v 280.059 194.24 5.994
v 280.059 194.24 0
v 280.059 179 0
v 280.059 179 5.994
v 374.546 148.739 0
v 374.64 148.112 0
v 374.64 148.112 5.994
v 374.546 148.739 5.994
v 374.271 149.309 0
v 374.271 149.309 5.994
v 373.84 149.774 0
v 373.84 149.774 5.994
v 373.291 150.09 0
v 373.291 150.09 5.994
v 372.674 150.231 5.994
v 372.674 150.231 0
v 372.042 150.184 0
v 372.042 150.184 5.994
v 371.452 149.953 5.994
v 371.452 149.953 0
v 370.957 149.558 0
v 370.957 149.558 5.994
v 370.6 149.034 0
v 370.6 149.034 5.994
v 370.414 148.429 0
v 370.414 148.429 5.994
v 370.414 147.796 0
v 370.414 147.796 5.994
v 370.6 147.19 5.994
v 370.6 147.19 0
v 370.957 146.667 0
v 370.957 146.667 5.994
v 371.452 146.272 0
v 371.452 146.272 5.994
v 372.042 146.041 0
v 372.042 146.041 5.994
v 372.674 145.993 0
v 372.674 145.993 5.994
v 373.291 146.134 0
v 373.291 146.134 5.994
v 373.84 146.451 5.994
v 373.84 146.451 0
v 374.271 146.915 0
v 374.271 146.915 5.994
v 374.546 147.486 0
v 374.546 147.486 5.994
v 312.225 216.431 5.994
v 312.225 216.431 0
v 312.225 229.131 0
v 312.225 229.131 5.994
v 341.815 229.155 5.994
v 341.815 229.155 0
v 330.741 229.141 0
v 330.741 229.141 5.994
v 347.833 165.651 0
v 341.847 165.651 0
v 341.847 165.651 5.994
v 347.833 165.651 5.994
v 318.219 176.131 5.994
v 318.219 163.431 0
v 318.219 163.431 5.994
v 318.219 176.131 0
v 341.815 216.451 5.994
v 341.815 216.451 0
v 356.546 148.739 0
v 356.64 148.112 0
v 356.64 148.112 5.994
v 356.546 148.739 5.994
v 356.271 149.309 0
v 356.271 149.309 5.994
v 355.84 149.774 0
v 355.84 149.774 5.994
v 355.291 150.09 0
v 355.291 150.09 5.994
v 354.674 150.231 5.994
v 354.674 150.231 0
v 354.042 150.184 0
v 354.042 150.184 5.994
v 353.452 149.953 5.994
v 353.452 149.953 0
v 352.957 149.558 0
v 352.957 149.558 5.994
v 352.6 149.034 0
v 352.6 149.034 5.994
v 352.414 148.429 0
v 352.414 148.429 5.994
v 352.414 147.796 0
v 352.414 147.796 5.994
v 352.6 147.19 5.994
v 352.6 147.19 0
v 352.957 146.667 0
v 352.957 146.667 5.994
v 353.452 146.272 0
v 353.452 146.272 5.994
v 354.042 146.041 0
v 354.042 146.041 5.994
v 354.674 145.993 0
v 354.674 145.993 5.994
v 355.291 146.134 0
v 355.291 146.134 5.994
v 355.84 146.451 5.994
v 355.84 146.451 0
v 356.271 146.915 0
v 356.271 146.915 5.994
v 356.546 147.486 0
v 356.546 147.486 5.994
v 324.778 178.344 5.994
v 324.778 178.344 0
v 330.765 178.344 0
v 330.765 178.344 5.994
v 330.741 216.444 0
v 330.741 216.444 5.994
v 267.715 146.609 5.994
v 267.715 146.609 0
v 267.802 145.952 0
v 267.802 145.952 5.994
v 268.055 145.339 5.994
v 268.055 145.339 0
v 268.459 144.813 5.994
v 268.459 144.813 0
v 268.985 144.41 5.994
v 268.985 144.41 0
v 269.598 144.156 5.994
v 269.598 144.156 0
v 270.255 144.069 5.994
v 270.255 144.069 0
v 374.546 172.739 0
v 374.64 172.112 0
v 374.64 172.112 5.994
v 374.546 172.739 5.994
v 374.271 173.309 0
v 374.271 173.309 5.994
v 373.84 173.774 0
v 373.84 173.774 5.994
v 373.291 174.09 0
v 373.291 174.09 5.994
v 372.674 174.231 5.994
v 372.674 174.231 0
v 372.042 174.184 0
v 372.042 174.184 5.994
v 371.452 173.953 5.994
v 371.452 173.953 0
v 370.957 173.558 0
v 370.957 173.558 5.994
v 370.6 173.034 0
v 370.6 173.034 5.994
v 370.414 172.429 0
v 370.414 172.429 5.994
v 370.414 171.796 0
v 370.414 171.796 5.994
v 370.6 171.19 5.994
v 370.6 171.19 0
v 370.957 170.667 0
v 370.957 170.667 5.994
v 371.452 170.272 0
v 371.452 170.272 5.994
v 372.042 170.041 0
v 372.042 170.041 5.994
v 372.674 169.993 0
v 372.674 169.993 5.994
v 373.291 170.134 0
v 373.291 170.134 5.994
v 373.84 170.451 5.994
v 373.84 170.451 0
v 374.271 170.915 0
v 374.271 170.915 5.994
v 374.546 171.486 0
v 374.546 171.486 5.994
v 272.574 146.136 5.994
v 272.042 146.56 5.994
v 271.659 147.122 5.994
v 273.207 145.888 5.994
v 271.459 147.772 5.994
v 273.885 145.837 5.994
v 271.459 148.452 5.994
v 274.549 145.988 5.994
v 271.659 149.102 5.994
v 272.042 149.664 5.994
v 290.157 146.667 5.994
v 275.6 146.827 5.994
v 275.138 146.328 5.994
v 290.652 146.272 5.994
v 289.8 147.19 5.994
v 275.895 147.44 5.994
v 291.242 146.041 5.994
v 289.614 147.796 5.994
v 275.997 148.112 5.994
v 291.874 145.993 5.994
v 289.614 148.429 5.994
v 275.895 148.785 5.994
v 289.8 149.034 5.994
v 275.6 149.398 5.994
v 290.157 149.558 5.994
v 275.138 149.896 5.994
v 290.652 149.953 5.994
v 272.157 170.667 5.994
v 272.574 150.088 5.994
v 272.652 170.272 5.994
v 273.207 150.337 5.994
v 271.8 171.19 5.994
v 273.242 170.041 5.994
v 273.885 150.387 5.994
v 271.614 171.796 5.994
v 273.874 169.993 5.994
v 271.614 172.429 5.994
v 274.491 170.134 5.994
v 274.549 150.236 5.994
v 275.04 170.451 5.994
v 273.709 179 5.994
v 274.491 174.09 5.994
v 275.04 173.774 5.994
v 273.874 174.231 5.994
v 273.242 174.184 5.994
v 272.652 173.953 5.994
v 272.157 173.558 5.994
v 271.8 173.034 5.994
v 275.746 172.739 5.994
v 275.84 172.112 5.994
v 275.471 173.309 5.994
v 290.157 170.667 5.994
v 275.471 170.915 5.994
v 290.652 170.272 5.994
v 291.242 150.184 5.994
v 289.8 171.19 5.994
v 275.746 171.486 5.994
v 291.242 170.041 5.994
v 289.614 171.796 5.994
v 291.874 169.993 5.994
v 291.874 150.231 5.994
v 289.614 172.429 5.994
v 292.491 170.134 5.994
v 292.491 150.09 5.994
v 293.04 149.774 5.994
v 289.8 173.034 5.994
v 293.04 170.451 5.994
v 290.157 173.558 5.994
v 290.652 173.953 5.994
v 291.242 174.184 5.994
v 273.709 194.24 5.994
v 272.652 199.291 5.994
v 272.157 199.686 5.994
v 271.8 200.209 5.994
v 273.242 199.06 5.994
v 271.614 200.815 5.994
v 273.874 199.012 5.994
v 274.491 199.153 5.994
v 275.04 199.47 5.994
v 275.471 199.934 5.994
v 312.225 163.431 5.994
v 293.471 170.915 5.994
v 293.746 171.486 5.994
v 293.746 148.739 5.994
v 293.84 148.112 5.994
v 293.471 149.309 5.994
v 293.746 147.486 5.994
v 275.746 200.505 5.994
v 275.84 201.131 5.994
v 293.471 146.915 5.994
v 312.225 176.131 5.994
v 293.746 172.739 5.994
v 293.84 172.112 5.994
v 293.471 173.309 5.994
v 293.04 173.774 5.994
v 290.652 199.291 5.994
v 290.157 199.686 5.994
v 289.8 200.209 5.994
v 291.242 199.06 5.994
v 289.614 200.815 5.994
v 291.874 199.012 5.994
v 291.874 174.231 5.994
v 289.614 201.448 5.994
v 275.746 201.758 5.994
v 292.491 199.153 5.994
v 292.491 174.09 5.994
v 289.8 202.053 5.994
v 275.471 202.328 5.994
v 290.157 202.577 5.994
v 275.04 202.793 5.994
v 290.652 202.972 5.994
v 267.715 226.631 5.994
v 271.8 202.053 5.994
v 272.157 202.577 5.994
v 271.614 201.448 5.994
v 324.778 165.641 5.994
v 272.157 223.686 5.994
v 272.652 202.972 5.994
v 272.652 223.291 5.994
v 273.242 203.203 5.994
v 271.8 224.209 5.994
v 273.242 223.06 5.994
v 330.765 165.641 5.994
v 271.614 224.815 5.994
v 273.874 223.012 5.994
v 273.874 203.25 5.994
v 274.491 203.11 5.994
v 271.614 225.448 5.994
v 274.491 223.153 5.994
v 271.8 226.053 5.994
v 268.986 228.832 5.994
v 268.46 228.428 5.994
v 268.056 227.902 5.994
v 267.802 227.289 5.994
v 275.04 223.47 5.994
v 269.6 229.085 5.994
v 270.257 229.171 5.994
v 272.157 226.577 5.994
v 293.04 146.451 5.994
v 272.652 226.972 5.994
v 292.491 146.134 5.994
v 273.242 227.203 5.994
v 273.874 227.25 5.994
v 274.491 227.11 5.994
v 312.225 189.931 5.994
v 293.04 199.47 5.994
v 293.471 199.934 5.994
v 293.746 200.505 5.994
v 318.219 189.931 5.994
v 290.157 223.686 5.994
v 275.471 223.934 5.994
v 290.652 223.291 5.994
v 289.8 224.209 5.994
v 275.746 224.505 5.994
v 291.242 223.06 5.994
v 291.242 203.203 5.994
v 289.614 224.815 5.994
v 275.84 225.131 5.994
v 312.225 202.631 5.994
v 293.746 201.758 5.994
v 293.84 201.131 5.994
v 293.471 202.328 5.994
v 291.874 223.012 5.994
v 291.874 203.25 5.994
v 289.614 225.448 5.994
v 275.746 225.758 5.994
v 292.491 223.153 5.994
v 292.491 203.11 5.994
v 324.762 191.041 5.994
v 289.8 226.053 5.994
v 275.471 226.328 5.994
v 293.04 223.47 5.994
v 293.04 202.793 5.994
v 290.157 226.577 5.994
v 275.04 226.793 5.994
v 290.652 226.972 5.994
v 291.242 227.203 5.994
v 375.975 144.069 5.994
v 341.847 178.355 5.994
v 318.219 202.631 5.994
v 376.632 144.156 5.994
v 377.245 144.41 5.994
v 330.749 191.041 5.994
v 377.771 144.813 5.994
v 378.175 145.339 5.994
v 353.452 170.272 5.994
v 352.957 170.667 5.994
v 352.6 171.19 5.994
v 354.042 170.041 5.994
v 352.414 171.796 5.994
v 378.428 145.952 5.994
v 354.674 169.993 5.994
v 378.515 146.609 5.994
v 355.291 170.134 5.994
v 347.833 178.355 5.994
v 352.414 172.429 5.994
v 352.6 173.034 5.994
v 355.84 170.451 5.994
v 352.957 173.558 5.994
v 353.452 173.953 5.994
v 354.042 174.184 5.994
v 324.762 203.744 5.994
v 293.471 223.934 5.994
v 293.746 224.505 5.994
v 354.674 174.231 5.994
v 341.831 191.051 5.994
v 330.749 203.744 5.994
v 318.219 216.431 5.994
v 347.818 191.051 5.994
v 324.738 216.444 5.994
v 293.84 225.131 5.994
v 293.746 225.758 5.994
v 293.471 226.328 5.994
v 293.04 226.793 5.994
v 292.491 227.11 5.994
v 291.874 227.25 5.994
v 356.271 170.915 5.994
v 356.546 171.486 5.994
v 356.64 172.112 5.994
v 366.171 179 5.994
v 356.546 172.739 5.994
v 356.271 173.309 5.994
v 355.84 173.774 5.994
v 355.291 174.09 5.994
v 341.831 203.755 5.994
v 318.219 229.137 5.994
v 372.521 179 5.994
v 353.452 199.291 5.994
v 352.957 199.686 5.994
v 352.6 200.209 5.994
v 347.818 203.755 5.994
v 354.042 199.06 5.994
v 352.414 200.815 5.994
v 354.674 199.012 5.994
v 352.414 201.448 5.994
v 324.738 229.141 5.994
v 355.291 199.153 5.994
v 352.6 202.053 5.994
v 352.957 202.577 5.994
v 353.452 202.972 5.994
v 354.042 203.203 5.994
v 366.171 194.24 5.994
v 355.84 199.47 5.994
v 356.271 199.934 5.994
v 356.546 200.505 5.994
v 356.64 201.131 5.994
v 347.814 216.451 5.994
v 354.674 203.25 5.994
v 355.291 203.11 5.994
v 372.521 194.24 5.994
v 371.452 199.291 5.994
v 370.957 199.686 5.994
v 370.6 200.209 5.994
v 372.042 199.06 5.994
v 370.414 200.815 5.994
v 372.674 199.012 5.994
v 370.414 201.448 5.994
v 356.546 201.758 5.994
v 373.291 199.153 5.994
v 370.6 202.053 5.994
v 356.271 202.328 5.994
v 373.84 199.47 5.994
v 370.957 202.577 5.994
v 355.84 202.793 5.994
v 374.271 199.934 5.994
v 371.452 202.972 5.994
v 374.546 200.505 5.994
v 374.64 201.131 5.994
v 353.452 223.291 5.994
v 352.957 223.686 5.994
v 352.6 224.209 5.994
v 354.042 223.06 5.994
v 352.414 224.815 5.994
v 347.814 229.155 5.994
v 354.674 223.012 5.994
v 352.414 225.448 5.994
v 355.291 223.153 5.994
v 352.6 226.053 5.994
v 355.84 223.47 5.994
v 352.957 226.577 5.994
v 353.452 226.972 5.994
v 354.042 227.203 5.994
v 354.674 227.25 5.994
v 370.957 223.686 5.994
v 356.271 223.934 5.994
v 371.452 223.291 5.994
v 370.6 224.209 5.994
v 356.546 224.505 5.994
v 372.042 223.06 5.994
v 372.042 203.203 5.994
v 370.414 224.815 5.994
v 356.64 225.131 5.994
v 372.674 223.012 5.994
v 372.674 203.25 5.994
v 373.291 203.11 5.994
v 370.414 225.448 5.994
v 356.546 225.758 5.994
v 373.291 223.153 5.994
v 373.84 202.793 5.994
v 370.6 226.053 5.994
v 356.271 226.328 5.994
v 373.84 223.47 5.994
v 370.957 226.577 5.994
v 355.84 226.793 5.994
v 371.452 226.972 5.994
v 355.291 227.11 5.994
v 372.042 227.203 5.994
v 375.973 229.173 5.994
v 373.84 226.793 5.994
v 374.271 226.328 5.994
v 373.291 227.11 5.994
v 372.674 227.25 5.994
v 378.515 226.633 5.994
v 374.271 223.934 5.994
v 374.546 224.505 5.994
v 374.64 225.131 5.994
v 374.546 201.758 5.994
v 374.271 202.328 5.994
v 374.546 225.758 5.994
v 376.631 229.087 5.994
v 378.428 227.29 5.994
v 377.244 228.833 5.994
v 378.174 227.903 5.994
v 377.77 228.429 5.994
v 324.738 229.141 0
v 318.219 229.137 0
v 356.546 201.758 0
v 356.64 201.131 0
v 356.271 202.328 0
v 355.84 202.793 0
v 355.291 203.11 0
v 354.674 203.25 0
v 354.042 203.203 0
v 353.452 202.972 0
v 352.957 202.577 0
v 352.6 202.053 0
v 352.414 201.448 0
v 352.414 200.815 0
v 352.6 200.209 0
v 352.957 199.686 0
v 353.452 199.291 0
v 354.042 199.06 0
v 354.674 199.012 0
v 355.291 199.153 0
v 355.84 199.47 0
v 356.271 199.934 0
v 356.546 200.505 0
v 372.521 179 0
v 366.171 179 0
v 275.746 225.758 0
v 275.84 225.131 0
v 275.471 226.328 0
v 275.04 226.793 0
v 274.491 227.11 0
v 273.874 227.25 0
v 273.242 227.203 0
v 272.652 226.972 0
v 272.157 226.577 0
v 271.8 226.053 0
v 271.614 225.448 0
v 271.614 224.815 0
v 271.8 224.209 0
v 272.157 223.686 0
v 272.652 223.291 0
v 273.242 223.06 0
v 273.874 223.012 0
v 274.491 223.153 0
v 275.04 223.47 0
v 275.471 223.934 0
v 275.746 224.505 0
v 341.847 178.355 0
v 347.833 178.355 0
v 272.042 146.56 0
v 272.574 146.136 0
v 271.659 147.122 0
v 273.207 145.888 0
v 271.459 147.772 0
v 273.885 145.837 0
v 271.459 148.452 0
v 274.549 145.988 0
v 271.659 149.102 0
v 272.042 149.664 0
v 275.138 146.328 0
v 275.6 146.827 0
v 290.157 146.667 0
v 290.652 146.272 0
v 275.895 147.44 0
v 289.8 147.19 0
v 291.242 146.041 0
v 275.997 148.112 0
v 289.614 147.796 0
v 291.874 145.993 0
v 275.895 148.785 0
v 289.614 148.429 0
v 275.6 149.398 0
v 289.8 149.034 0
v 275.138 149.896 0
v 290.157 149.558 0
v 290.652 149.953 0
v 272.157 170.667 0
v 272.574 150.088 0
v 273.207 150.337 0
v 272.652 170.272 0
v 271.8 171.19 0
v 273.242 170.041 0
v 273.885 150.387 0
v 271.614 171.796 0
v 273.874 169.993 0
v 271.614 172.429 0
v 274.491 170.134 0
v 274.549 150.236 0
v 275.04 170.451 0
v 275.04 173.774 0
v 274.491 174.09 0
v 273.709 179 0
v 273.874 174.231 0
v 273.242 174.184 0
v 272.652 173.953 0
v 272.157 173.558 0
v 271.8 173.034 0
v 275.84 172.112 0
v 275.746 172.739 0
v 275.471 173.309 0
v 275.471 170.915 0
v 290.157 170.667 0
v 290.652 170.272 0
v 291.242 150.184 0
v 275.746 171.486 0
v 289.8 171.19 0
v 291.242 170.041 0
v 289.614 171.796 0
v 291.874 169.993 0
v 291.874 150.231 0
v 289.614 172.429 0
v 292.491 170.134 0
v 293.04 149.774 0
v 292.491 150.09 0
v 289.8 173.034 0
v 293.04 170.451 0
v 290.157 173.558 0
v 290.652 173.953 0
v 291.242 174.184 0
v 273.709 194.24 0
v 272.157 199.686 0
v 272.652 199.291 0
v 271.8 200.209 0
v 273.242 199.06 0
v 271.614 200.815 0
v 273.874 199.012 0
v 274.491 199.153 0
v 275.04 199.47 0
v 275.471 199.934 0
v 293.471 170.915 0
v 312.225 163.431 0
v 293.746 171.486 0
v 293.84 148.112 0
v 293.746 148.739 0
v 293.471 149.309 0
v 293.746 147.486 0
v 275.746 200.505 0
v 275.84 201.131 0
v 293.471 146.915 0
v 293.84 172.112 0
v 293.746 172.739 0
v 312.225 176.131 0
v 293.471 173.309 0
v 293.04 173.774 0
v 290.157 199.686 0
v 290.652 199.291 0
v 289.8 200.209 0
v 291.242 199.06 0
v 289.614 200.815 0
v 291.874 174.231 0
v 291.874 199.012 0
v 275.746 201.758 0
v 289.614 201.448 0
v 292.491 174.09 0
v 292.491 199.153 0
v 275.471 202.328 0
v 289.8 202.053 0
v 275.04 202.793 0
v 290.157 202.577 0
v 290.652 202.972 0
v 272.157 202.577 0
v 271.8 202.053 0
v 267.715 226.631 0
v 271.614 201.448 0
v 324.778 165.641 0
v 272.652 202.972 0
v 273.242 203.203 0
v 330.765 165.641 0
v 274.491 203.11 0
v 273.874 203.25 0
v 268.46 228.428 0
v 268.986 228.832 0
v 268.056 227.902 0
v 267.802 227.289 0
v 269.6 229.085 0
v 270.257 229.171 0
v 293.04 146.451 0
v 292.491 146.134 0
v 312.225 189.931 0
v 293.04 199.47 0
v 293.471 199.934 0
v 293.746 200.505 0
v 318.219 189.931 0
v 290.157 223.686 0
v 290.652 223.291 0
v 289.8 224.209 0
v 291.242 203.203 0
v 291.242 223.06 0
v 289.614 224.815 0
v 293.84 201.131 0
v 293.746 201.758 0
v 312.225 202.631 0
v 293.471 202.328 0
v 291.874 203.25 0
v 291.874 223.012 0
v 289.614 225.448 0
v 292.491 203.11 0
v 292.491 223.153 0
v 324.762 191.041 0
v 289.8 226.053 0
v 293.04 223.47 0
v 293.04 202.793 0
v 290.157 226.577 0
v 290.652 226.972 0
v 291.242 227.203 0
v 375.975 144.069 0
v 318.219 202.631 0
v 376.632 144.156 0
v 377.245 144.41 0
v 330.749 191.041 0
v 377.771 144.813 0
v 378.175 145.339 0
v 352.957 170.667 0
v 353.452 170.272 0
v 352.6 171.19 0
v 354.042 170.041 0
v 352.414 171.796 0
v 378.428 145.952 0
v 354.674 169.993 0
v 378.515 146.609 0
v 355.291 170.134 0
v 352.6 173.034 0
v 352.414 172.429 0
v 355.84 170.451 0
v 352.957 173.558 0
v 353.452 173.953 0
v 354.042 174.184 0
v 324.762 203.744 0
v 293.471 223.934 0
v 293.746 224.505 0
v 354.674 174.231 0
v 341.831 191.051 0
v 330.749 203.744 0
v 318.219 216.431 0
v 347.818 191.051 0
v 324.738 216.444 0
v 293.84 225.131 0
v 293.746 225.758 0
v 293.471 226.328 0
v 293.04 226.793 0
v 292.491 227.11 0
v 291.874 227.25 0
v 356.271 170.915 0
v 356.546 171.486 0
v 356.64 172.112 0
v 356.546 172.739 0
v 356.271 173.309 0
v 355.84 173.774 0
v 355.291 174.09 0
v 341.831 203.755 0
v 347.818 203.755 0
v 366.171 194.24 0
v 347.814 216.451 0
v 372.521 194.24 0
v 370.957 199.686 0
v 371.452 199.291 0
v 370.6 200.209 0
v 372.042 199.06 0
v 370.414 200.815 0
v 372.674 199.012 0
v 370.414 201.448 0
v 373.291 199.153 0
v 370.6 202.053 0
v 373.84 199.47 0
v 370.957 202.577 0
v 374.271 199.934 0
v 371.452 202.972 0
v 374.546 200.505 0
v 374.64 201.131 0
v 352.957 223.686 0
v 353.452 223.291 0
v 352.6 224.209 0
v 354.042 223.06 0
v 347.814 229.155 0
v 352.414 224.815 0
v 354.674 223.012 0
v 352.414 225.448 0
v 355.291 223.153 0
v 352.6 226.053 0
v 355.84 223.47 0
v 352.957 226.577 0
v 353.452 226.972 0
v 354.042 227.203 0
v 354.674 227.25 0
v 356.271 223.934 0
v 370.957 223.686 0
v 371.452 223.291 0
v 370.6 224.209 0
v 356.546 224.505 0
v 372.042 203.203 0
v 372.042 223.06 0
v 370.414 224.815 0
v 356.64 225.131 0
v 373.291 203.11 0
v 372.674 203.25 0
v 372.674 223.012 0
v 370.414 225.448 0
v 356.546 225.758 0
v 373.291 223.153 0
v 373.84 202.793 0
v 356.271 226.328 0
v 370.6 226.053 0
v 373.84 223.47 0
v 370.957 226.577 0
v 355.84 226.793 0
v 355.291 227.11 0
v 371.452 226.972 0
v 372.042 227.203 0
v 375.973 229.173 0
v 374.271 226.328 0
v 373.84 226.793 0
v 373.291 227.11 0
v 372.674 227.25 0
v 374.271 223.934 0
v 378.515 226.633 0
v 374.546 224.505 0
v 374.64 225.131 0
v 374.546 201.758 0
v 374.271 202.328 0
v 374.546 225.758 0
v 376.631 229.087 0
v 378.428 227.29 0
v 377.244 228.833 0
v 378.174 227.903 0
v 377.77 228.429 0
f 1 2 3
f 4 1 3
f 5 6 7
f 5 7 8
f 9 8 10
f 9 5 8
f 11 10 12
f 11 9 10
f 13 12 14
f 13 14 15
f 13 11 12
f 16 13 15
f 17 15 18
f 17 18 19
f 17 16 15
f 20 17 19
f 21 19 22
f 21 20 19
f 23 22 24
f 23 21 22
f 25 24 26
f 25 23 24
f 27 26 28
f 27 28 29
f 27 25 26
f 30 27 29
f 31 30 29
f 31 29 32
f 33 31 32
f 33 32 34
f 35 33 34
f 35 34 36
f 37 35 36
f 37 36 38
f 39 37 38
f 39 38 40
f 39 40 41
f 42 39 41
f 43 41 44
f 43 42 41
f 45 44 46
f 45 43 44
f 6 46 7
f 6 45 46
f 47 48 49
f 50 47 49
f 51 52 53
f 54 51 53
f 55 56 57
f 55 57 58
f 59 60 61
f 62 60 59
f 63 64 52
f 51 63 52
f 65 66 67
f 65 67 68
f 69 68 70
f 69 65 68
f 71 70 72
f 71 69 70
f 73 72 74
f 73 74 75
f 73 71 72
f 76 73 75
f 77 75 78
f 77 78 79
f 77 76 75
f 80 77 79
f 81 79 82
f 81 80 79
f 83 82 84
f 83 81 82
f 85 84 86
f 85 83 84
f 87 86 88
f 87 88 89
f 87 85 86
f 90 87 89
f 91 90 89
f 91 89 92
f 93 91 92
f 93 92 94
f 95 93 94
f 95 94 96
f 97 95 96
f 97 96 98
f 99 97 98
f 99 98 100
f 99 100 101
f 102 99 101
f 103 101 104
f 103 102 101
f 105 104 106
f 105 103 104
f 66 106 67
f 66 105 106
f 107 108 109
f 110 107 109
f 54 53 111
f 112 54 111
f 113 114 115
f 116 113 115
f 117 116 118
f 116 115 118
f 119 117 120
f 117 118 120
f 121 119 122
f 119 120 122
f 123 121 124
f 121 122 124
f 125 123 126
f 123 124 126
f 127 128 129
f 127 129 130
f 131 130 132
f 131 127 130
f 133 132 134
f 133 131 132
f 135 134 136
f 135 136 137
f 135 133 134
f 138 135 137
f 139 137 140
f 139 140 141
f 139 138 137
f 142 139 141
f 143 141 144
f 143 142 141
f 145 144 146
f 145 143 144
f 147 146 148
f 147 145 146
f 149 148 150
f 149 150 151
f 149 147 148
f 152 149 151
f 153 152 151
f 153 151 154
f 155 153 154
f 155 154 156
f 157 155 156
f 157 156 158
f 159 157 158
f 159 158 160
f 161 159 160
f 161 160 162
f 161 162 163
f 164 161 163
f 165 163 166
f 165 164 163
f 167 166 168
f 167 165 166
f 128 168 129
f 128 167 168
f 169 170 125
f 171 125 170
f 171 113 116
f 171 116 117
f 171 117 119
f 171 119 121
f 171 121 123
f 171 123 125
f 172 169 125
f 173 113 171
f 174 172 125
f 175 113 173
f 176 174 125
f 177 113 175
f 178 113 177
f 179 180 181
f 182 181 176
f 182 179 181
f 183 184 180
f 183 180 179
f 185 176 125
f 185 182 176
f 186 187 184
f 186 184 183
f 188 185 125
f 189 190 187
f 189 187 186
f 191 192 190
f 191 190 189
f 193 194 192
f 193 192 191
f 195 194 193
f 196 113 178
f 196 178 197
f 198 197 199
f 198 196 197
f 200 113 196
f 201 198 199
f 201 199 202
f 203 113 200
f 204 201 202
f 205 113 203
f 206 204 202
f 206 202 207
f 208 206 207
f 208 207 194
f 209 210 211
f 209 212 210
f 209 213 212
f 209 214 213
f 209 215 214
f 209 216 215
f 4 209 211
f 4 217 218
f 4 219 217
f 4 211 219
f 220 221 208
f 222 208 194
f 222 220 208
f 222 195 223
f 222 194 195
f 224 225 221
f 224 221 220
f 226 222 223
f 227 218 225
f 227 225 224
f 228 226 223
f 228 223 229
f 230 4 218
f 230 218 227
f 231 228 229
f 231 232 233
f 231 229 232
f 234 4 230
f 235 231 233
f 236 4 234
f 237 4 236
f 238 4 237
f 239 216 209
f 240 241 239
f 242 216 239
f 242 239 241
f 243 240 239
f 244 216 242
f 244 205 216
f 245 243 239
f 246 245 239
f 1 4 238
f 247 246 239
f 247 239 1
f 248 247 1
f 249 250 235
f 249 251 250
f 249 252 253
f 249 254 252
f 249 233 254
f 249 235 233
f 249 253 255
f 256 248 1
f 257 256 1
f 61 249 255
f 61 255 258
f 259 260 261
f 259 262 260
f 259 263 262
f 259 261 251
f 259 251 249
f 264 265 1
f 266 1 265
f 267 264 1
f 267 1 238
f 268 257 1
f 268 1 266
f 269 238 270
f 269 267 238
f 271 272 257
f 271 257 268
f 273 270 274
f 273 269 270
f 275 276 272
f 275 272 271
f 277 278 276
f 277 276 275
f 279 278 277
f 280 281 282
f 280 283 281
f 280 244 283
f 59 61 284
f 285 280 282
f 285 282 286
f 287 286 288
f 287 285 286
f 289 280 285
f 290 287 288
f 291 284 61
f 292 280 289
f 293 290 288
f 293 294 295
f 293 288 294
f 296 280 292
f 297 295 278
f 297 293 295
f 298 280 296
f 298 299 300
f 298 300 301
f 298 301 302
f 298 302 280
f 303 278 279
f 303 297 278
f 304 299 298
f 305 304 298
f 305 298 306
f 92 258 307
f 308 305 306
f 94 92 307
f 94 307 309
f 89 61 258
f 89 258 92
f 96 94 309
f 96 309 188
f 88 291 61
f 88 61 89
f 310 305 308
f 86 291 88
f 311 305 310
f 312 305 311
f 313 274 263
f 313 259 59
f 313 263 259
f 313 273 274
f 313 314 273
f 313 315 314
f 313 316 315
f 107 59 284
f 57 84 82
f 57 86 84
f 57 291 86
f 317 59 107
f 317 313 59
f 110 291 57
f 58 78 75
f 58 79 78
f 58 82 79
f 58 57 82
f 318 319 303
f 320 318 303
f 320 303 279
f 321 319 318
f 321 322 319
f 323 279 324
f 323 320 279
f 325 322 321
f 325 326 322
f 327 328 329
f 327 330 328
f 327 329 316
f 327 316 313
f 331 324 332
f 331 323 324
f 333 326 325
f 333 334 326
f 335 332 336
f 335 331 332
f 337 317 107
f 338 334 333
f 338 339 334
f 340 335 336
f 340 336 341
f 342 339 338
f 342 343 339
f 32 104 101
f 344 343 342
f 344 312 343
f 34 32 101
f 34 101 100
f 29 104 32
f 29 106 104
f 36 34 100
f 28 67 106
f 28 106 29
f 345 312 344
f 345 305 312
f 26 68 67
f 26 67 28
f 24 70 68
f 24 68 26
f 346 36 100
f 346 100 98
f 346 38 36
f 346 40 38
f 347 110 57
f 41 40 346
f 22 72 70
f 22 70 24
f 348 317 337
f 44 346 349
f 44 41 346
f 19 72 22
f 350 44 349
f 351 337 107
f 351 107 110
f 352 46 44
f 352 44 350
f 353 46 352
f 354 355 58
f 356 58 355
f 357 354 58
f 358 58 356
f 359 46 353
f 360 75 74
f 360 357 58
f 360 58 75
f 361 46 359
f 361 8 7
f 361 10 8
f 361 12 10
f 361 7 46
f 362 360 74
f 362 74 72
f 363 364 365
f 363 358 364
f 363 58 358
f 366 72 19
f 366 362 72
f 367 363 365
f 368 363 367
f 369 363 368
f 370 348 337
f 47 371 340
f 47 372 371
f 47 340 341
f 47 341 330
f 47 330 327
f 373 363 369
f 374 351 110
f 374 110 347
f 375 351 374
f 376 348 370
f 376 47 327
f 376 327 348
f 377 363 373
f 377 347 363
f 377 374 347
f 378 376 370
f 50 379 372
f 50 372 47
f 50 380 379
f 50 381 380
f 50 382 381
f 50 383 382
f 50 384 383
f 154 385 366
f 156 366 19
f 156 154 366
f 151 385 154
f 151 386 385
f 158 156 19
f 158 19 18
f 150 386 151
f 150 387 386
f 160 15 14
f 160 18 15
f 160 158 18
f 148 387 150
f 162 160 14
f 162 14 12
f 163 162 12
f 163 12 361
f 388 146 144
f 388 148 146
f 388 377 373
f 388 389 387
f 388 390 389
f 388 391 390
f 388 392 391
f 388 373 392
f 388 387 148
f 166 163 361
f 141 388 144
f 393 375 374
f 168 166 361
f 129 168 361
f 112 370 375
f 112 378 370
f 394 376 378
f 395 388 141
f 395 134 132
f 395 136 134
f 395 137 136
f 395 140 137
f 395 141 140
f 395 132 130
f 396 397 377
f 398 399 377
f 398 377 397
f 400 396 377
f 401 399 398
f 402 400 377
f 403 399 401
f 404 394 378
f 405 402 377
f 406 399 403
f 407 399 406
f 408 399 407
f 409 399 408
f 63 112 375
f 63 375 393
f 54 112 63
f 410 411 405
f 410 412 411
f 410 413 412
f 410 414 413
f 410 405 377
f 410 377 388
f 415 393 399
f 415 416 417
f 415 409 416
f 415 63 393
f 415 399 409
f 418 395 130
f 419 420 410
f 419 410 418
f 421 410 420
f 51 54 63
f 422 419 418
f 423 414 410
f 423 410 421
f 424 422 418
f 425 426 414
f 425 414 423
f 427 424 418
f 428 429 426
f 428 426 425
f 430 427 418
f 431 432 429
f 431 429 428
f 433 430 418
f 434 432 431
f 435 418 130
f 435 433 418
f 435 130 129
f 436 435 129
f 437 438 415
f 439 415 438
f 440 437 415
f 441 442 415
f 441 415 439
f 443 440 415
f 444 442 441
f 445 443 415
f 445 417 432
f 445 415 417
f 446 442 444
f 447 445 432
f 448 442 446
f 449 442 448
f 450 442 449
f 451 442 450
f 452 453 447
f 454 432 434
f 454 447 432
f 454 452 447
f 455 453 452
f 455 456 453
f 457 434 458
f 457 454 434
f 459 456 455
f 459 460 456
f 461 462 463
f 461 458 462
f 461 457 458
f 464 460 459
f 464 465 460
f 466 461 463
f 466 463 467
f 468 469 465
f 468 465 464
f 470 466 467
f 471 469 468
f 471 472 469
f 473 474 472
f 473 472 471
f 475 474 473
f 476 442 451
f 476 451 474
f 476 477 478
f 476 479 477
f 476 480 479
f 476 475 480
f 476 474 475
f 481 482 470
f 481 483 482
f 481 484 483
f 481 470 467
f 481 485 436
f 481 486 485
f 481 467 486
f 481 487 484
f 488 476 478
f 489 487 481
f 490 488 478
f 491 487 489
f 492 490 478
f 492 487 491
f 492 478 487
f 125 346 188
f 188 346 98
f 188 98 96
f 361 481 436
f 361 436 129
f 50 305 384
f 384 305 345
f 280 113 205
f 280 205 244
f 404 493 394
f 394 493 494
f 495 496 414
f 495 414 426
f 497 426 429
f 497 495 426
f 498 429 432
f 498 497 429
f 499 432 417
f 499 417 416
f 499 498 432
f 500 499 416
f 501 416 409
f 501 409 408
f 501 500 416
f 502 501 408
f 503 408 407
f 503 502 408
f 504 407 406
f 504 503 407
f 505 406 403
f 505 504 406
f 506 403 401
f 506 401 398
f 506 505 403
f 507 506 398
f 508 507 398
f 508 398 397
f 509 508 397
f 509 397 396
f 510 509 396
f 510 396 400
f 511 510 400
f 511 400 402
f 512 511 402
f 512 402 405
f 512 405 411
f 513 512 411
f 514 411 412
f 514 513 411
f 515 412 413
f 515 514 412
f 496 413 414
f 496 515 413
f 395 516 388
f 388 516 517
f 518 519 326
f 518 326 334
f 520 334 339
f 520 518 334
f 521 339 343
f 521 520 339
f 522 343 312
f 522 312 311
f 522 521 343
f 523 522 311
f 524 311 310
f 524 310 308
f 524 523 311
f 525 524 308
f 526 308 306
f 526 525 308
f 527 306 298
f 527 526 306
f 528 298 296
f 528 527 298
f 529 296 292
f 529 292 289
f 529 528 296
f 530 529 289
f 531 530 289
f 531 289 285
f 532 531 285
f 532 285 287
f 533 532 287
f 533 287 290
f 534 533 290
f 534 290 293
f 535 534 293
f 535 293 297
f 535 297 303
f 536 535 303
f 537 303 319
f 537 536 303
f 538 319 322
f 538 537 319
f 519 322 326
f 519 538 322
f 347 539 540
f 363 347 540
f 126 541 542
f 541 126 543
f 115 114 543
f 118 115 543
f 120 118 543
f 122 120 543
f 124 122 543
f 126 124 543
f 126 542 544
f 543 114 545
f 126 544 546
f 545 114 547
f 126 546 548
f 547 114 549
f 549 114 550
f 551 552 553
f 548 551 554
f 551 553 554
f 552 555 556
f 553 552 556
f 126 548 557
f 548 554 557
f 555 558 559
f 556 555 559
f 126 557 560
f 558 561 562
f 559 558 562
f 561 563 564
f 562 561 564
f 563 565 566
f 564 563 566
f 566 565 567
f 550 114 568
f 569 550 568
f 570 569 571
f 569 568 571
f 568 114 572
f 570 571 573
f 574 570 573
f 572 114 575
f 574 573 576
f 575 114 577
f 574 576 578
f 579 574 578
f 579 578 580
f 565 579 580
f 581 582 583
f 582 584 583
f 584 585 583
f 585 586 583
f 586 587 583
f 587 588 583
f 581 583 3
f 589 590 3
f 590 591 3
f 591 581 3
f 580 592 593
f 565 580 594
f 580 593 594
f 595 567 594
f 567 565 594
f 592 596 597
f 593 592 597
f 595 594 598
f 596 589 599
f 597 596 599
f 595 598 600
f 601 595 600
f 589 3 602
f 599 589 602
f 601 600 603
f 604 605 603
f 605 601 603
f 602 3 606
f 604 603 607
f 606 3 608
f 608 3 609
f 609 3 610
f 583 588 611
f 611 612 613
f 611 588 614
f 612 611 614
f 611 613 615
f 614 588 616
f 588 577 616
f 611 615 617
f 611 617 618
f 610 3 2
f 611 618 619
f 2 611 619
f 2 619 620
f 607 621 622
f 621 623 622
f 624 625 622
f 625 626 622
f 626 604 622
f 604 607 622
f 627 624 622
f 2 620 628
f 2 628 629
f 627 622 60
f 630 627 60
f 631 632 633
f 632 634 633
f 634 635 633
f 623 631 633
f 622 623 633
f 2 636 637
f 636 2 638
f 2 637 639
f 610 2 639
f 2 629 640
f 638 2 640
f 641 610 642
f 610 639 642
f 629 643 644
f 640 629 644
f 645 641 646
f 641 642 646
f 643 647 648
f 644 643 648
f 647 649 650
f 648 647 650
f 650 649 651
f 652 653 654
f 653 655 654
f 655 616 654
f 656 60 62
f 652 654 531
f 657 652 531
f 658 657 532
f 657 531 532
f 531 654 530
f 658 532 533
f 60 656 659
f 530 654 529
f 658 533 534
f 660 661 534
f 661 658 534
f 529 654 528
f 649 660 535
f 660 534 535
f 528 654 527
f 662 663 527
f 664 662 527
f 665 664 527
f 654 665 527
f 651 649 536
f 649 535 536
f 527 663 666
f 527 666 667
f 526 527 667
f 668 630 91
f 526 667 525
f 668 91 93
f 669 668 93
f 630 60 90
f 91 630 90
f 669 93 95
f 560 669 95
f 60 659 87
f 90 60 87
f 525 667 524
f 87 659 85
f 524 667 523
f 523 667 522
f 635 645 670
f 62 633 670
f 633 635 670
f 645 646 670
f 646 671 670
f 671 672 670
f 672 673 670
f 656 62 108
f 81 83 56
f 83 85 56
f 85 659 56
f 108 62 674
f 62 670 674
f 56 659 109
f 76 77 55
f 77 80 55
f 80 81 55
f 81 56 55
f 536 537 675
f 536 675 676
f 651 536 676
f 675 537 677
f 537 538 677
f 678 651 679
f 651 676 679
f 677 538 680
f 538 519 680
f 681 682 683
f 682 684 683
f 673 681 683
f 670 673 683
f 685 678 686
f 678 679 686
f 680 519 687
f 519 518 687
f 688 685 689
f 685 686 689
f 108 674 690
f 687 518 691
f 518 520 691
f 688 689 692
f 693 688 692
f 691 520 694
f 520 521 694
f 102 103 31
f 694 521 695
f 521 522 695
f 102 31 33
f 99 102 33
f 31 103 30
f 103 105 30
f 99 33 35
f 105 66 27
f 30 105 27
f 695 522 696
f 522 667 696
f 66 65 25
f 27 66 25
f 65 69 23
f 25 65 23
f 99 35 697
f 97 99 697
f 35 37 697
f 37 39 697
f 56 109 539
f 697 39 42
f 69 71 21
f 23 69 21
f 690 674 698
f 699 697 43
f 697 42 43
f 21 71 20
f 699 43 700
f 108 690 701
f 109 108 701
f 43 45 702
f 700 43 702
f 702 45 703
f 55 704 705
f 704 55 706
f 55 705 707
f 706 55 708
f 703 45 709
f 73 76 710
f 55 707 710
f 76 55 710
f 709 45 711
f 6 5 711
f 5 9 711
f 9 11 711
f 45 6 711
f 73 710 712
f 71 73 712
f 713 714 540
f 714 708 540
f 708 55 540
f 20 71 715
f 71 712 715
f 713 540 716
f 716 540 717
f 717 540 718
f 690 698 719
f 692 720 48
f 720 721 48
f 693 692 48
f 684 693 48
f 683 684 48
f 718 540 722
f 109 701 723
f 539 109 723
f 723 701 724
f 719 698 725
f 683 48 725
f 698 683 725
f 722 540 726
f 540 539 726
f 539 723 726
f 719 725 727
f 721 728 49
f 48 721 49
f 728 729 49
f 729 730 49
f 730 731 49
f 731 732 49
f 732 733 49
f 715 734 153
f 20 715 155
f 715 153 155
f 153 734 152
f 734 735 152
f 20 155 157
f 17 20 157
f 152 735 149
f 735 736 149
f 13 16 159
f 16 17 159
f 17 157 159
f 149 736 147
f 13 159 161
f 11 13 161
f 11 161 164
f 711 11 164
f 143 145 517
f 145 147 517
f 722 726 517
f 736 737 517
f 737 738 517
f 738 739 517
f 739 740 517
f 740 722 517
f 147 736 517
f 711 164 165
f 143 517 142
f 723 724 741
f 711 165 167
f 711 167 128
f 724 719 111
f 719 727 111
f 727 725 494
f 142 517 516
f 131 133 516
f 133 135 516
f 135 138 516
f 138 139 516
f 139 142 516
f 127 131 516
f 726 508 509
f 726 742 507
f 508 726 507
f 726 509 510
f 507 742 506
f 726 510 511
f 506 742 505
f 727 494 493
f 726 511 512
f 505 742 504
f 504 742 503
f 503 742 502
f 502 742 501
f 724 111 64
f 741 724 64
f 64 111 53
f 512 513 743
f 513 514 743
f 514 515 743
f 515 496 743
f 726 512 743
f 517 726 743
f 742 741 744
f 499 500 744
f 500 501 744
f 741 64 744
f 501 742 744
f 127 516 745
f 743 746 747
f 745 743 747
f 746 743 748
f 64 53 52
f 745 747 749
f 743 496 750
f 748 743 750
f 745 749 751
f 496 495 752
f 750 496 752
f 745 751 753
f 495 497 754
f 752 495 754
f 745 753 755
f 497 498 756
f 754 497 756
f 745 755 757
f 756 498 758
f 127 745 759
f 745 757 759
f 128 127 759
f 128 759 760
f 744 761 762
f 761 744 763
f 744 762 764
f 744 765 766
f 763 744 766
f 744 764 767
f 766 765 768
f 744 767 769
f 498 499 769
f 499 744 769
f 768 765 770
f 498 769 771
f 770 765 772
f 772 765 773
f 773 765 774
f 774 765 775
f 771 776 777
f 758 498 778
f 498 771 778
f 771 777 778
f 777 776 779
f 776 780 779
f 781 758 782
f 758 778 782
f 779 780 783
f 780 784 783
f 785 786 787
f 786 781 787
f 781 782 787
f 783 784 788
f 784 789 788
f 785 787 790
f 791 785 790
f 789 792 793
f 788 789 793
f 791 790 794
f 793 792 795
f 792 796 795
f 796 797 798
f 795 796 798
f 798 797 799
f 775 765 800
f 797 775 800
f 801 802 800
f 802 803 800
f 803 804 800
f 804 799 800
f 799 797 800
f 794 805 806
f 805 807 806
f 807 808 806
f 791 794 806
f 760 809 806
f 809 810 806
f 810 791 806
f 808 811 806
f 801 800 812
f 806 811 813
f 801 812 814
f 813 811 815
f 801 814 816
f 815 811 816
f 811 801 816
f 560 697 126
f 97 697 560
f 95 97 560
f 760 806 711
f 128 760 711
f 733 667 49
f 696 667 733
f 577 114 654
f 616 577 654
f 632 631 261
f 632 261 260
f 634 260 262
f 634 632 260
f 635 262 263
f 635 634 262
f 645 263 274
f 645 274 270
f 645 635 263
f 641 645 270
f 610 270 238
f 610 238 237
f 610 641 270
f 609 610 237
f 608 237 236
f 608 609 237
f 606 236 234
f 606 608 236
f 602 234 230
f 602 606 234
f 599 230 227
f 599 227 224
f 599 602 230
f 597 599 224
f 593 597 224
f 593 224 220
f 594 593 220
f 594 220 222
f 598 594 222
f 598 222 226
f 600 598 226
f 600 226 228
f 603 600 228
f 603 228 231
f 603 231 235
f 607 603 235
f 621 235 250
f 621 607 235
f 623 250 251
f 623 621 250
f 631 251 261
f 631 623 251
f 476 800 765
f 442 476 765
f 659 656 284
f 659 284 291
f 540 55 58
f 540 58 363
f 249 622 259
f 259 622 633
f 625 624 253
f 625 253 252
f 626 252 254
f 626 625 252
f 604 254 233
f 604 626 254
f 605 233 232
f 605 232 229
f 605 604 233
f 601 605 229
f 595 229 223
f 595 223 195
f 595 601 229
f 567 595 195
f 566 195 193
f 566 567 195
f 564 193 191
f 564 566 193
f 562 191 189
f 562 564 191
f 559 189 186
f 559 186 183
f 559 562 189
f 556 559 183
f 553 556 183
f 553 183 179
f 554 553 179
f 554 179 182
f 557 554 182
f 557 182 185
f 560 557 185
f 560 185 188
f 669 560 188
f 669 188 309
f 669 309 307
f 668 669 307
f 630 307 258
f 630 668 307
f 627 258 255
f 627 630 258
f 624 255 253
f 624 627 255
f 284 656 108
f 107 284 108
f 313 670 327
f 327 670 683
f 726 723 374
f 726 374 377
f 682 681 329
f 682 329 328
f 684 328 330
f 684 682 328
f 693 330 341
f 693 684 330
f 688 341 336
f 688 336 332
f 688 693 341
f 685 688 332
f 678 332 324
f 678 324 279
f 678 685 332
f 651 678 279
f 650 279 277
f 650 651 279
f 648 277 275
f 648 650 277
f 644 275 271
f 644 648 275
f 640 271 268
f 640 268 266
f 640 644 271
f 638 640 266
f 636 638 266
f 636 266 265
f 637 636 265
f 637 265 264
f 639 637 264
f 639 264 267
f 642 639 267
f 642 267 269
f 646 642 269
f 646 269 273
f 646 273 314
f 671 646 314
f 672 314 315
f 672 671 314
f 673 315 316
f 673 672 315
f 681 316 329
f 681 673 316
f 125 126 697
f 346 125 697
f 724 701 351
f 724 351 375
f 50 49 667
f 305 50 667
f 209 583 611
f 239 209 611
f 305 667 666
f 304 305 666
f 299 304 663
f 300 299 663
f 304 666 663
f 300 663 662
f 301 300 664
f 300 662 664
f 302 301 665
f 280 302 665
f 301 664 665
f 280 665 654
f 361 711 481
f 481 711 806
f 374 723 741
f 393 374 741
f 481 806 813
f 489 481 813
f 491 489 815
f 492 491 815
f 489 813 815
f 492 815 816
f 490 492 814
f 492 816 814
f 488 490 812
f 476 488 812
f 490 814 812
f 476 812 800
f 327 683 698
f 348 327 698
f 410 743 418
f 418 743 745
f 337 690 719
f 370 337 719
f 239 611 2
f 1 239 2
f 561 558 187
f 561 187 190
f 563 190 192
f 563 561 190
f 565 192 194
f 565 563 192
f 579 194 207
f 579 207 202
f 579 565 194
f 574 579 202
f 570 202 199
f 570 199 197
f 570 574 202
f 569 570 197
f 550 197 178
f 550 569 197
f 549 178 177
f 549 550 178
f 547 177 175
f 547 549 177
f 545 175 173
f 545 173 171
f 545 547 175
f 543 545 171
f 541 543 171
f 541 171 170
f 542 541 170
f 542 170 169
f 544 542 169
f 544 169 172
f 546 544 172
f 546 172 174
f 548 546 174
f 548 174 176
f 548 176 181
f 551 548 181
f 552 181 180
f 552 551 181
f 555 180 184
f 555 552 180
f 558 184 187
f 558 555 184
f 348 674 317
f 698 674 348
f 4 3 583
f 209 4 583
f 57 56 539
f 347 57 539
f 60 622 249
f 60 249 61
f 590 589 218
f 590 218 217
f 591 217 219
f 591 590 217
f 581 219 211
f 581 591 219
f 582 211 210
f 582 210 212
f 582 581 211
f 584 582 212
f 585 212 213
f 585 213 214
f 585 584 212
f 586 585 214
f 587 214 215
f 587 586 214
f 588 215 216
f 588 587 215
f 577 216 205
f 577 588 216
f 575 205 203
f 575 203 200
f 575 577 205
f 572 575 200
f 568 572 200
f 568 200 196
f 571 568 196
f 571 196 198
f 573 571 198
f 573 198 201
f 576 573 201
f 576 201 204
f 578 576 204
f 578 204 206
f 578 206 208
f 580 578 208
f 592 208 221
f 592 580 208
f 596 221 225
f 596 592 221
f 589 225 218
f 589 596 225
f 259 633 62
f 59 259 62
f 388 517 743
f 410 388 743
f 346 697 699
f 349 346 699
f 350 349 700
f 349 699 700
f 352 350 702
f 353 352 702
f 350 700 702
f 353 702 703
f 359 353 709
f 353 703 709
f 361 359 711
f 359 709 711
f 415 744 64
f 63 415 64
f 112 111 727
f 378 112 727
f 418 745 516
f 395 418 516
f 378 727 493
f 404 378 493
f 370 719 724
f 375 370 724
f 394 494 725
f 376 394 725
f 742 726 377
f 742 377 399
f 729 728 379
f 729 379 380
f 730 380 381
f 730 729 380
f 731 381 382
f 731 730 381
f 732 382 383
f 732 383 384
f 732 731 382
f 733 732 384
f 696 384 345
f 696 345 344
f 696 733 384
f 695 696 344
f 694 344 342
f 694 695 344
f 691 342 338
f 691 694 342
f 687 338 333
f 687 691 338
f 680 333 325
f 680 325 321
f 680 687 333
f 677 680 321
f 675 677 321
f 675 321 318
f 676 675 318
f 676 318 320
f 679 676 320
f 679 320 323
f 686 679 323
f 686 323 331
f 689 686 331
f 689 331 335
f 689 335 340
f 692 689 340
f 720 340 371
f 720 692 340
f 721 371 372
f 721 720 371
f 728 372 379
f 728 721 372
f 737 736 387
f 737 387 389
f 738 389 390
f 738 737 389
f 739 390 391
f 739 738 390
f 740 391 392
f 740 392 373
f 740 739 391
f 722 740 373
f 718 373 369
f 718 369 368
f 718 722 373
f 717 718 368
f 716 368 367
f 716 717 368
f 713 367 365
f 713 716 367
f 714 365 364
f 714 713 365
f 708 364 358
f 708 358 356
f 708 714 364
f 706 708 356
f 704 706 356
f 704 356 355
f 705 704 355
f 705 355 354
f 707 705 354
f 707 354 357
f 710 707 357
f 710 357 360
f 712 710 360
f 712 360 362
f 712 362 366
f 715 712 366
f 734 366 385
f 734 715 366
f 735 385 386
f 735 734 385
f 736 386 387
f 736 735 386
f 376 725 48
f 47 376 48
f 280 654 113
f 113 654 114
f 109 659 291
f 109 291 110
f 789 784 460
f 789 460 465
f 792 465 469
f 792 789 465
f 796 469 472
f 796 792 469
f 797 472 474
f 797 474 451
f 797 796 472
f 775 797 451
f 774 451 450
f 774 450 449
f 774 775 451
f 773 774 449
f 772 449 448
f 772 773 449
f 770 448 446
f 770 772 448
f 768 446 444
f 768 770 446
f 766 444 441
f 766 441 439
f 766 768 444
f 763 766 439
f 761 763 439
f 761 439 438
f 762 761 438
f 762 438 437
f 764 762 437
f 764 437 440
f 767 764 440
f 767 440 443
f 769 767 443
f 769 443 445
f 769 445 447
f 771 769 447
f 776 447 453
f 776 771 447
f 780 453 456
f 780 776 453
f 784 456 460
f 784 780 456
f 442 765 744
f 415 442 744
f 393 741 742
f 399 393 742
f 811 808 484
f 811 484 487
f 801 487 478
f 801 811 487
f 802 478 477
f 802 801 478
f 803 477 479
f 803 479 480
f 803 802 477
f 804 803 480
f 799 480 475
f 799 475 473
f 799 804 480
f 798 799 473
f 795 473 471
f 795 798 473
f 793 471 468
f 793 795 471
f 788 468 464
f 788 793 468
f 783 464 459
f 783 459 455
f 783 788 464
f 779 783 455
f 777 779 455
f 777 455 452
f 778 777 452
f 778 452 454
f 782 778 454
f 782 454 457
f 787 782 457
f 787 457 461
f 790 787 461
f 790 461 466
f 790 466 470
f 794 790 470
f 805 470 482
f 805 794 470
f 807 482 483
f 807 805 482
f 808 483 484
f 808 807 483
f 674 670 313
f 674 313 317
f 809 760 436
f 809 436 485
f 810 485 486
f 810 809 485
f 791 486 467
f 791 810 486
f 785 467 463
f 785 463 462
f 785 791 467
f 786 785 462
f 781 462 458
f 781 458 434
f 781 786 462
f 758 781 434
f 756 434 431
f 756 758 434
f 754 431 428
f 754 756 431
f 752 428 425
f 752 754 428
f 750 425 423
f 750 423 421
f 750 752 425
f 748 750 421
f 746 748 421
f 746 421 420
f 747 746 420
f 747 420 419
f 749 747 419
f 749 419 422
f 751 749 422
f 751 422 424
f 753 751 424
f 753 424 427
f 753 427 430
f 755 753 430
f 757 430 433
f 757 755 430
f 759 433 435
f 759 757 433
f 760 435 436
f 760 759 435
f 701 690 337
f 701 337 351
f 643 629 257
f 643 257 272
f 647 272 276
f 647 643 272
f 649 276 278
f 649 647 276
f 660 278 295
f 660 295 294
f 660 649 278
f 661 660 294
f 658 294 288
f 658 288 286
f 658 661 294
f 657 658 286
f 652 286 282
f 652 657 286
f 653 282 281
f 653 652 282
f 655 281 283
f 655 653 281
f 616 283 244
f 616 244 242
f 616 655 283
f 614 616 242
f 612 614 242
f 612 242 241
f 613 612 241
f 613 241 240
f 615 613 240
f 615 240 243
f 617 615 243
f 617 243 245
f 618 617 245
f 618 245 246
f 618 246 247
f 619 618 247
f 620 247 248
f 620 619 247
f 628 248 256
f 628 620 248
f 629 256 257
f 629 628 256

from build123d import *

# Parameters (mm, degrees)
SKETCH1_R           = 2.281562065
SKETCH1_R_2         = 2.125
SKETCH1_W           = 5.9944
SKETCH1_H           = 12.7
SKETCH1_W_2         = 5.986441201
SKETCH1_H_2         = 12.703753504
SKETCH1_W_3         = 5.986441202
BOSS_EXTRUDE1_DEPTH = 5.9944


with BuildPart() as part:
    # Sketch1 → Boss-Extrude1 (new body)
    with BuildSketch(Plane.XY):
        with BuildLine():
            Line((270.254984812, 144.069366267), (333.659384812, 144.069366267))
            Line((333.659384812, 144.069366267), (339.653784812, 144.069366267))
            Line((339.653784812, 144.069366267), (375.974984812, 144.069366267))
            ThreePointArc((375.974984812, 144.069366267), (377.771036036, 144.813315043), (378.514984812, 146.609366267))
            Line((378.514984812, 146.609366267), (378.514984812, 226.632730682))
            ThreePointArc((378.514984812, 226.632730682), (377.770473259, 228.429344507), (375.973393287, 229.172730183))
            Line((375.973393287, 229.172730183), (347.813544609, 229.155085658))
            Line((347.813544609, 229.155085658), (347.813544609, 216.451324674))
            Line((347.813544609, 216.451324674), (341.815166975, 216.451324674))
            Line((341.815166975, 216.451324674), (341.815166975, 229.155085658))
            Line((341.815166975, 229.155085658), (330.740769149, 229.140627138))
            Line((330.740769149, 229.140627138), (330.740769149, 216.444385628))
            Line((330.740769149, 216.444385628), (324.738412704, 216.444385628))
            Line((324.738412704, 216.444385628), (324.738412704, 229.140627138))
            Line((324.738412704, 229.140627138), (318.219144609, 229.136542265))
            Line((318.219144609, 229.136542265), (318.219144609, 216.431429486))
            Line((318.219144609, 216.431429486), (312.224744609, 216.431429486))
            Line((312.224744609, 216.431429486), (312.224744609, 229.131429486))
            Line((312.224744609, 229.131429486), (270.25739927, 229.171322574))
            ThreePointArc((270.25739927, 229.171322574), (268.45978743, 228.428228383), (267.714984812, 226.631323721))
            Line((267.714984812, 226.631323721), (267.714984812, 146.609366267))
            ThreePointArc((267.714984812, 146.609366267), (268.458933587, 144.813315043), (270.254984812, 144.069366267))
        make_face()
        with Locations((273.714984812, 148.112259486)):
            Circle(SKETCH1_R, mode=Mode.SUBTRACT)
        with Locations((291.714984812, 148.112259486)):
            Circle(SKETCH1_R_2, mode=Mode.SUBTRACT)
        with Locations((273.714984812, 172.112259486)):
            Circle(SKETCH1_R_2, mode=Mode.SUBTRACT)
        with Locations((291.714984812, 172.112259486)):
            Circle(SKETCH1_R_2, mode=Mode.SUBTRACT)
        Polygon((273.709384812, 179.000344994), (273.709384812, 186.620344994), (273.709384812, 194.240344994), (280.059384812, 194.240344994), (280.059384812, 179.000344994), align=None, mode=Mode.SUBTRACT)
        with Locations((315.221944609, 169.781429486)):
            Rectangle(SKETCH1_W, SKETCH1_H, mode=Mode.SUBTRACT)
        with Locations((354.514984812, 148.112259486)):
            Circle(SKETCH1_R_2, mode=Mode.SUBTRACT)
        with Locations((372.514984812, 148.112259486)):
            Circle(SKETCH1_R_2, mode=Mode.SUBTRACT)
        with Locations((327.771421413, 171.992516355)):
            Rectangle(SKETCH1_W_2, SKETCH1_H_2, mode=Mode.SUBTRACT)
        with Locations((344.840218063, 172.003211399)):
            Rectangle(SKETCH1_W_3, SKETCH1_H_2, mode=Mode.SUBTRACT)
        with Locations((354.514984812, 172.112259486)):
            Circle(SKETCH1_R_2, mode=Mode.SUBTRACT)
        with Locations((372.514984812, 172.112259486)):
            Circle(SKETCH1_R_2, mode=Mode.SUBTRACT)
        Polygon((372.520584812, 186.620344994), (372.520584812, 179.000344994), (366.170584812, 179.000344994), (366.170584812, 194.240344994), (372.520584812, 194.240344994), align=None, mode=Mode.SUBTRACT)
        with Locations((273.714984812, 201.131429486)):
            Circle(SKETCH1_R_2, mode=Mode.SUBTRACT)
        with Locations((291.714984812, 201.131429486)):
            Circle(SKETCH1_R_2, mode=Mode.SUBTRACT)
        with Locations((315.221944609, 196.281429486)):
            Rectangle(SKETCH1_W, SKETCH1_H, mode=Mode.SUBTRACT)
        with Locations((273.714984812, 225.131429486)):
            Circle(SKETCH1_R_2, mode=Mode.SUBTRACT)
        with Locations((291.714984812, 225.131429486)):
            Circle(SKETCH1_R_2, mode=Mode.SUBTRACT)
        with Locations((327.75550617, 197.392511369)):
            Rectangle(SKETCH1_W_3, SKETCH1_H_2, mode=Mode.SUBTRACT)
        with Locations((344.82430282, 197.403206413)):
            Rectangle(SKETCH1_W_2, SKETCH1_H_2, mode=Mode.SUBTRACT)
        with Locations((354.514984812, 201.131429486)):
            Circle(SKETCH1_R_2, mode=Mode.SUBTRACT)
        with Locations((372.514984812, 201.131429486)):
            Circle(SKETCH1_R_2, mode=Mode.SUBTRACT)
        with Locations((354.514984812, 225.131429486)):
            Circle(SKETCH1_R_2, mode=Mode.SUBTRACT)
        with Locations((372.514984812, 225.131429486)):
            Circle(SKETCH1_R_2, mode=Mode.SUBTRACT)
    extrude(amount=BOSS_EXTRUDE1_DEPTH)


solid = part.part
